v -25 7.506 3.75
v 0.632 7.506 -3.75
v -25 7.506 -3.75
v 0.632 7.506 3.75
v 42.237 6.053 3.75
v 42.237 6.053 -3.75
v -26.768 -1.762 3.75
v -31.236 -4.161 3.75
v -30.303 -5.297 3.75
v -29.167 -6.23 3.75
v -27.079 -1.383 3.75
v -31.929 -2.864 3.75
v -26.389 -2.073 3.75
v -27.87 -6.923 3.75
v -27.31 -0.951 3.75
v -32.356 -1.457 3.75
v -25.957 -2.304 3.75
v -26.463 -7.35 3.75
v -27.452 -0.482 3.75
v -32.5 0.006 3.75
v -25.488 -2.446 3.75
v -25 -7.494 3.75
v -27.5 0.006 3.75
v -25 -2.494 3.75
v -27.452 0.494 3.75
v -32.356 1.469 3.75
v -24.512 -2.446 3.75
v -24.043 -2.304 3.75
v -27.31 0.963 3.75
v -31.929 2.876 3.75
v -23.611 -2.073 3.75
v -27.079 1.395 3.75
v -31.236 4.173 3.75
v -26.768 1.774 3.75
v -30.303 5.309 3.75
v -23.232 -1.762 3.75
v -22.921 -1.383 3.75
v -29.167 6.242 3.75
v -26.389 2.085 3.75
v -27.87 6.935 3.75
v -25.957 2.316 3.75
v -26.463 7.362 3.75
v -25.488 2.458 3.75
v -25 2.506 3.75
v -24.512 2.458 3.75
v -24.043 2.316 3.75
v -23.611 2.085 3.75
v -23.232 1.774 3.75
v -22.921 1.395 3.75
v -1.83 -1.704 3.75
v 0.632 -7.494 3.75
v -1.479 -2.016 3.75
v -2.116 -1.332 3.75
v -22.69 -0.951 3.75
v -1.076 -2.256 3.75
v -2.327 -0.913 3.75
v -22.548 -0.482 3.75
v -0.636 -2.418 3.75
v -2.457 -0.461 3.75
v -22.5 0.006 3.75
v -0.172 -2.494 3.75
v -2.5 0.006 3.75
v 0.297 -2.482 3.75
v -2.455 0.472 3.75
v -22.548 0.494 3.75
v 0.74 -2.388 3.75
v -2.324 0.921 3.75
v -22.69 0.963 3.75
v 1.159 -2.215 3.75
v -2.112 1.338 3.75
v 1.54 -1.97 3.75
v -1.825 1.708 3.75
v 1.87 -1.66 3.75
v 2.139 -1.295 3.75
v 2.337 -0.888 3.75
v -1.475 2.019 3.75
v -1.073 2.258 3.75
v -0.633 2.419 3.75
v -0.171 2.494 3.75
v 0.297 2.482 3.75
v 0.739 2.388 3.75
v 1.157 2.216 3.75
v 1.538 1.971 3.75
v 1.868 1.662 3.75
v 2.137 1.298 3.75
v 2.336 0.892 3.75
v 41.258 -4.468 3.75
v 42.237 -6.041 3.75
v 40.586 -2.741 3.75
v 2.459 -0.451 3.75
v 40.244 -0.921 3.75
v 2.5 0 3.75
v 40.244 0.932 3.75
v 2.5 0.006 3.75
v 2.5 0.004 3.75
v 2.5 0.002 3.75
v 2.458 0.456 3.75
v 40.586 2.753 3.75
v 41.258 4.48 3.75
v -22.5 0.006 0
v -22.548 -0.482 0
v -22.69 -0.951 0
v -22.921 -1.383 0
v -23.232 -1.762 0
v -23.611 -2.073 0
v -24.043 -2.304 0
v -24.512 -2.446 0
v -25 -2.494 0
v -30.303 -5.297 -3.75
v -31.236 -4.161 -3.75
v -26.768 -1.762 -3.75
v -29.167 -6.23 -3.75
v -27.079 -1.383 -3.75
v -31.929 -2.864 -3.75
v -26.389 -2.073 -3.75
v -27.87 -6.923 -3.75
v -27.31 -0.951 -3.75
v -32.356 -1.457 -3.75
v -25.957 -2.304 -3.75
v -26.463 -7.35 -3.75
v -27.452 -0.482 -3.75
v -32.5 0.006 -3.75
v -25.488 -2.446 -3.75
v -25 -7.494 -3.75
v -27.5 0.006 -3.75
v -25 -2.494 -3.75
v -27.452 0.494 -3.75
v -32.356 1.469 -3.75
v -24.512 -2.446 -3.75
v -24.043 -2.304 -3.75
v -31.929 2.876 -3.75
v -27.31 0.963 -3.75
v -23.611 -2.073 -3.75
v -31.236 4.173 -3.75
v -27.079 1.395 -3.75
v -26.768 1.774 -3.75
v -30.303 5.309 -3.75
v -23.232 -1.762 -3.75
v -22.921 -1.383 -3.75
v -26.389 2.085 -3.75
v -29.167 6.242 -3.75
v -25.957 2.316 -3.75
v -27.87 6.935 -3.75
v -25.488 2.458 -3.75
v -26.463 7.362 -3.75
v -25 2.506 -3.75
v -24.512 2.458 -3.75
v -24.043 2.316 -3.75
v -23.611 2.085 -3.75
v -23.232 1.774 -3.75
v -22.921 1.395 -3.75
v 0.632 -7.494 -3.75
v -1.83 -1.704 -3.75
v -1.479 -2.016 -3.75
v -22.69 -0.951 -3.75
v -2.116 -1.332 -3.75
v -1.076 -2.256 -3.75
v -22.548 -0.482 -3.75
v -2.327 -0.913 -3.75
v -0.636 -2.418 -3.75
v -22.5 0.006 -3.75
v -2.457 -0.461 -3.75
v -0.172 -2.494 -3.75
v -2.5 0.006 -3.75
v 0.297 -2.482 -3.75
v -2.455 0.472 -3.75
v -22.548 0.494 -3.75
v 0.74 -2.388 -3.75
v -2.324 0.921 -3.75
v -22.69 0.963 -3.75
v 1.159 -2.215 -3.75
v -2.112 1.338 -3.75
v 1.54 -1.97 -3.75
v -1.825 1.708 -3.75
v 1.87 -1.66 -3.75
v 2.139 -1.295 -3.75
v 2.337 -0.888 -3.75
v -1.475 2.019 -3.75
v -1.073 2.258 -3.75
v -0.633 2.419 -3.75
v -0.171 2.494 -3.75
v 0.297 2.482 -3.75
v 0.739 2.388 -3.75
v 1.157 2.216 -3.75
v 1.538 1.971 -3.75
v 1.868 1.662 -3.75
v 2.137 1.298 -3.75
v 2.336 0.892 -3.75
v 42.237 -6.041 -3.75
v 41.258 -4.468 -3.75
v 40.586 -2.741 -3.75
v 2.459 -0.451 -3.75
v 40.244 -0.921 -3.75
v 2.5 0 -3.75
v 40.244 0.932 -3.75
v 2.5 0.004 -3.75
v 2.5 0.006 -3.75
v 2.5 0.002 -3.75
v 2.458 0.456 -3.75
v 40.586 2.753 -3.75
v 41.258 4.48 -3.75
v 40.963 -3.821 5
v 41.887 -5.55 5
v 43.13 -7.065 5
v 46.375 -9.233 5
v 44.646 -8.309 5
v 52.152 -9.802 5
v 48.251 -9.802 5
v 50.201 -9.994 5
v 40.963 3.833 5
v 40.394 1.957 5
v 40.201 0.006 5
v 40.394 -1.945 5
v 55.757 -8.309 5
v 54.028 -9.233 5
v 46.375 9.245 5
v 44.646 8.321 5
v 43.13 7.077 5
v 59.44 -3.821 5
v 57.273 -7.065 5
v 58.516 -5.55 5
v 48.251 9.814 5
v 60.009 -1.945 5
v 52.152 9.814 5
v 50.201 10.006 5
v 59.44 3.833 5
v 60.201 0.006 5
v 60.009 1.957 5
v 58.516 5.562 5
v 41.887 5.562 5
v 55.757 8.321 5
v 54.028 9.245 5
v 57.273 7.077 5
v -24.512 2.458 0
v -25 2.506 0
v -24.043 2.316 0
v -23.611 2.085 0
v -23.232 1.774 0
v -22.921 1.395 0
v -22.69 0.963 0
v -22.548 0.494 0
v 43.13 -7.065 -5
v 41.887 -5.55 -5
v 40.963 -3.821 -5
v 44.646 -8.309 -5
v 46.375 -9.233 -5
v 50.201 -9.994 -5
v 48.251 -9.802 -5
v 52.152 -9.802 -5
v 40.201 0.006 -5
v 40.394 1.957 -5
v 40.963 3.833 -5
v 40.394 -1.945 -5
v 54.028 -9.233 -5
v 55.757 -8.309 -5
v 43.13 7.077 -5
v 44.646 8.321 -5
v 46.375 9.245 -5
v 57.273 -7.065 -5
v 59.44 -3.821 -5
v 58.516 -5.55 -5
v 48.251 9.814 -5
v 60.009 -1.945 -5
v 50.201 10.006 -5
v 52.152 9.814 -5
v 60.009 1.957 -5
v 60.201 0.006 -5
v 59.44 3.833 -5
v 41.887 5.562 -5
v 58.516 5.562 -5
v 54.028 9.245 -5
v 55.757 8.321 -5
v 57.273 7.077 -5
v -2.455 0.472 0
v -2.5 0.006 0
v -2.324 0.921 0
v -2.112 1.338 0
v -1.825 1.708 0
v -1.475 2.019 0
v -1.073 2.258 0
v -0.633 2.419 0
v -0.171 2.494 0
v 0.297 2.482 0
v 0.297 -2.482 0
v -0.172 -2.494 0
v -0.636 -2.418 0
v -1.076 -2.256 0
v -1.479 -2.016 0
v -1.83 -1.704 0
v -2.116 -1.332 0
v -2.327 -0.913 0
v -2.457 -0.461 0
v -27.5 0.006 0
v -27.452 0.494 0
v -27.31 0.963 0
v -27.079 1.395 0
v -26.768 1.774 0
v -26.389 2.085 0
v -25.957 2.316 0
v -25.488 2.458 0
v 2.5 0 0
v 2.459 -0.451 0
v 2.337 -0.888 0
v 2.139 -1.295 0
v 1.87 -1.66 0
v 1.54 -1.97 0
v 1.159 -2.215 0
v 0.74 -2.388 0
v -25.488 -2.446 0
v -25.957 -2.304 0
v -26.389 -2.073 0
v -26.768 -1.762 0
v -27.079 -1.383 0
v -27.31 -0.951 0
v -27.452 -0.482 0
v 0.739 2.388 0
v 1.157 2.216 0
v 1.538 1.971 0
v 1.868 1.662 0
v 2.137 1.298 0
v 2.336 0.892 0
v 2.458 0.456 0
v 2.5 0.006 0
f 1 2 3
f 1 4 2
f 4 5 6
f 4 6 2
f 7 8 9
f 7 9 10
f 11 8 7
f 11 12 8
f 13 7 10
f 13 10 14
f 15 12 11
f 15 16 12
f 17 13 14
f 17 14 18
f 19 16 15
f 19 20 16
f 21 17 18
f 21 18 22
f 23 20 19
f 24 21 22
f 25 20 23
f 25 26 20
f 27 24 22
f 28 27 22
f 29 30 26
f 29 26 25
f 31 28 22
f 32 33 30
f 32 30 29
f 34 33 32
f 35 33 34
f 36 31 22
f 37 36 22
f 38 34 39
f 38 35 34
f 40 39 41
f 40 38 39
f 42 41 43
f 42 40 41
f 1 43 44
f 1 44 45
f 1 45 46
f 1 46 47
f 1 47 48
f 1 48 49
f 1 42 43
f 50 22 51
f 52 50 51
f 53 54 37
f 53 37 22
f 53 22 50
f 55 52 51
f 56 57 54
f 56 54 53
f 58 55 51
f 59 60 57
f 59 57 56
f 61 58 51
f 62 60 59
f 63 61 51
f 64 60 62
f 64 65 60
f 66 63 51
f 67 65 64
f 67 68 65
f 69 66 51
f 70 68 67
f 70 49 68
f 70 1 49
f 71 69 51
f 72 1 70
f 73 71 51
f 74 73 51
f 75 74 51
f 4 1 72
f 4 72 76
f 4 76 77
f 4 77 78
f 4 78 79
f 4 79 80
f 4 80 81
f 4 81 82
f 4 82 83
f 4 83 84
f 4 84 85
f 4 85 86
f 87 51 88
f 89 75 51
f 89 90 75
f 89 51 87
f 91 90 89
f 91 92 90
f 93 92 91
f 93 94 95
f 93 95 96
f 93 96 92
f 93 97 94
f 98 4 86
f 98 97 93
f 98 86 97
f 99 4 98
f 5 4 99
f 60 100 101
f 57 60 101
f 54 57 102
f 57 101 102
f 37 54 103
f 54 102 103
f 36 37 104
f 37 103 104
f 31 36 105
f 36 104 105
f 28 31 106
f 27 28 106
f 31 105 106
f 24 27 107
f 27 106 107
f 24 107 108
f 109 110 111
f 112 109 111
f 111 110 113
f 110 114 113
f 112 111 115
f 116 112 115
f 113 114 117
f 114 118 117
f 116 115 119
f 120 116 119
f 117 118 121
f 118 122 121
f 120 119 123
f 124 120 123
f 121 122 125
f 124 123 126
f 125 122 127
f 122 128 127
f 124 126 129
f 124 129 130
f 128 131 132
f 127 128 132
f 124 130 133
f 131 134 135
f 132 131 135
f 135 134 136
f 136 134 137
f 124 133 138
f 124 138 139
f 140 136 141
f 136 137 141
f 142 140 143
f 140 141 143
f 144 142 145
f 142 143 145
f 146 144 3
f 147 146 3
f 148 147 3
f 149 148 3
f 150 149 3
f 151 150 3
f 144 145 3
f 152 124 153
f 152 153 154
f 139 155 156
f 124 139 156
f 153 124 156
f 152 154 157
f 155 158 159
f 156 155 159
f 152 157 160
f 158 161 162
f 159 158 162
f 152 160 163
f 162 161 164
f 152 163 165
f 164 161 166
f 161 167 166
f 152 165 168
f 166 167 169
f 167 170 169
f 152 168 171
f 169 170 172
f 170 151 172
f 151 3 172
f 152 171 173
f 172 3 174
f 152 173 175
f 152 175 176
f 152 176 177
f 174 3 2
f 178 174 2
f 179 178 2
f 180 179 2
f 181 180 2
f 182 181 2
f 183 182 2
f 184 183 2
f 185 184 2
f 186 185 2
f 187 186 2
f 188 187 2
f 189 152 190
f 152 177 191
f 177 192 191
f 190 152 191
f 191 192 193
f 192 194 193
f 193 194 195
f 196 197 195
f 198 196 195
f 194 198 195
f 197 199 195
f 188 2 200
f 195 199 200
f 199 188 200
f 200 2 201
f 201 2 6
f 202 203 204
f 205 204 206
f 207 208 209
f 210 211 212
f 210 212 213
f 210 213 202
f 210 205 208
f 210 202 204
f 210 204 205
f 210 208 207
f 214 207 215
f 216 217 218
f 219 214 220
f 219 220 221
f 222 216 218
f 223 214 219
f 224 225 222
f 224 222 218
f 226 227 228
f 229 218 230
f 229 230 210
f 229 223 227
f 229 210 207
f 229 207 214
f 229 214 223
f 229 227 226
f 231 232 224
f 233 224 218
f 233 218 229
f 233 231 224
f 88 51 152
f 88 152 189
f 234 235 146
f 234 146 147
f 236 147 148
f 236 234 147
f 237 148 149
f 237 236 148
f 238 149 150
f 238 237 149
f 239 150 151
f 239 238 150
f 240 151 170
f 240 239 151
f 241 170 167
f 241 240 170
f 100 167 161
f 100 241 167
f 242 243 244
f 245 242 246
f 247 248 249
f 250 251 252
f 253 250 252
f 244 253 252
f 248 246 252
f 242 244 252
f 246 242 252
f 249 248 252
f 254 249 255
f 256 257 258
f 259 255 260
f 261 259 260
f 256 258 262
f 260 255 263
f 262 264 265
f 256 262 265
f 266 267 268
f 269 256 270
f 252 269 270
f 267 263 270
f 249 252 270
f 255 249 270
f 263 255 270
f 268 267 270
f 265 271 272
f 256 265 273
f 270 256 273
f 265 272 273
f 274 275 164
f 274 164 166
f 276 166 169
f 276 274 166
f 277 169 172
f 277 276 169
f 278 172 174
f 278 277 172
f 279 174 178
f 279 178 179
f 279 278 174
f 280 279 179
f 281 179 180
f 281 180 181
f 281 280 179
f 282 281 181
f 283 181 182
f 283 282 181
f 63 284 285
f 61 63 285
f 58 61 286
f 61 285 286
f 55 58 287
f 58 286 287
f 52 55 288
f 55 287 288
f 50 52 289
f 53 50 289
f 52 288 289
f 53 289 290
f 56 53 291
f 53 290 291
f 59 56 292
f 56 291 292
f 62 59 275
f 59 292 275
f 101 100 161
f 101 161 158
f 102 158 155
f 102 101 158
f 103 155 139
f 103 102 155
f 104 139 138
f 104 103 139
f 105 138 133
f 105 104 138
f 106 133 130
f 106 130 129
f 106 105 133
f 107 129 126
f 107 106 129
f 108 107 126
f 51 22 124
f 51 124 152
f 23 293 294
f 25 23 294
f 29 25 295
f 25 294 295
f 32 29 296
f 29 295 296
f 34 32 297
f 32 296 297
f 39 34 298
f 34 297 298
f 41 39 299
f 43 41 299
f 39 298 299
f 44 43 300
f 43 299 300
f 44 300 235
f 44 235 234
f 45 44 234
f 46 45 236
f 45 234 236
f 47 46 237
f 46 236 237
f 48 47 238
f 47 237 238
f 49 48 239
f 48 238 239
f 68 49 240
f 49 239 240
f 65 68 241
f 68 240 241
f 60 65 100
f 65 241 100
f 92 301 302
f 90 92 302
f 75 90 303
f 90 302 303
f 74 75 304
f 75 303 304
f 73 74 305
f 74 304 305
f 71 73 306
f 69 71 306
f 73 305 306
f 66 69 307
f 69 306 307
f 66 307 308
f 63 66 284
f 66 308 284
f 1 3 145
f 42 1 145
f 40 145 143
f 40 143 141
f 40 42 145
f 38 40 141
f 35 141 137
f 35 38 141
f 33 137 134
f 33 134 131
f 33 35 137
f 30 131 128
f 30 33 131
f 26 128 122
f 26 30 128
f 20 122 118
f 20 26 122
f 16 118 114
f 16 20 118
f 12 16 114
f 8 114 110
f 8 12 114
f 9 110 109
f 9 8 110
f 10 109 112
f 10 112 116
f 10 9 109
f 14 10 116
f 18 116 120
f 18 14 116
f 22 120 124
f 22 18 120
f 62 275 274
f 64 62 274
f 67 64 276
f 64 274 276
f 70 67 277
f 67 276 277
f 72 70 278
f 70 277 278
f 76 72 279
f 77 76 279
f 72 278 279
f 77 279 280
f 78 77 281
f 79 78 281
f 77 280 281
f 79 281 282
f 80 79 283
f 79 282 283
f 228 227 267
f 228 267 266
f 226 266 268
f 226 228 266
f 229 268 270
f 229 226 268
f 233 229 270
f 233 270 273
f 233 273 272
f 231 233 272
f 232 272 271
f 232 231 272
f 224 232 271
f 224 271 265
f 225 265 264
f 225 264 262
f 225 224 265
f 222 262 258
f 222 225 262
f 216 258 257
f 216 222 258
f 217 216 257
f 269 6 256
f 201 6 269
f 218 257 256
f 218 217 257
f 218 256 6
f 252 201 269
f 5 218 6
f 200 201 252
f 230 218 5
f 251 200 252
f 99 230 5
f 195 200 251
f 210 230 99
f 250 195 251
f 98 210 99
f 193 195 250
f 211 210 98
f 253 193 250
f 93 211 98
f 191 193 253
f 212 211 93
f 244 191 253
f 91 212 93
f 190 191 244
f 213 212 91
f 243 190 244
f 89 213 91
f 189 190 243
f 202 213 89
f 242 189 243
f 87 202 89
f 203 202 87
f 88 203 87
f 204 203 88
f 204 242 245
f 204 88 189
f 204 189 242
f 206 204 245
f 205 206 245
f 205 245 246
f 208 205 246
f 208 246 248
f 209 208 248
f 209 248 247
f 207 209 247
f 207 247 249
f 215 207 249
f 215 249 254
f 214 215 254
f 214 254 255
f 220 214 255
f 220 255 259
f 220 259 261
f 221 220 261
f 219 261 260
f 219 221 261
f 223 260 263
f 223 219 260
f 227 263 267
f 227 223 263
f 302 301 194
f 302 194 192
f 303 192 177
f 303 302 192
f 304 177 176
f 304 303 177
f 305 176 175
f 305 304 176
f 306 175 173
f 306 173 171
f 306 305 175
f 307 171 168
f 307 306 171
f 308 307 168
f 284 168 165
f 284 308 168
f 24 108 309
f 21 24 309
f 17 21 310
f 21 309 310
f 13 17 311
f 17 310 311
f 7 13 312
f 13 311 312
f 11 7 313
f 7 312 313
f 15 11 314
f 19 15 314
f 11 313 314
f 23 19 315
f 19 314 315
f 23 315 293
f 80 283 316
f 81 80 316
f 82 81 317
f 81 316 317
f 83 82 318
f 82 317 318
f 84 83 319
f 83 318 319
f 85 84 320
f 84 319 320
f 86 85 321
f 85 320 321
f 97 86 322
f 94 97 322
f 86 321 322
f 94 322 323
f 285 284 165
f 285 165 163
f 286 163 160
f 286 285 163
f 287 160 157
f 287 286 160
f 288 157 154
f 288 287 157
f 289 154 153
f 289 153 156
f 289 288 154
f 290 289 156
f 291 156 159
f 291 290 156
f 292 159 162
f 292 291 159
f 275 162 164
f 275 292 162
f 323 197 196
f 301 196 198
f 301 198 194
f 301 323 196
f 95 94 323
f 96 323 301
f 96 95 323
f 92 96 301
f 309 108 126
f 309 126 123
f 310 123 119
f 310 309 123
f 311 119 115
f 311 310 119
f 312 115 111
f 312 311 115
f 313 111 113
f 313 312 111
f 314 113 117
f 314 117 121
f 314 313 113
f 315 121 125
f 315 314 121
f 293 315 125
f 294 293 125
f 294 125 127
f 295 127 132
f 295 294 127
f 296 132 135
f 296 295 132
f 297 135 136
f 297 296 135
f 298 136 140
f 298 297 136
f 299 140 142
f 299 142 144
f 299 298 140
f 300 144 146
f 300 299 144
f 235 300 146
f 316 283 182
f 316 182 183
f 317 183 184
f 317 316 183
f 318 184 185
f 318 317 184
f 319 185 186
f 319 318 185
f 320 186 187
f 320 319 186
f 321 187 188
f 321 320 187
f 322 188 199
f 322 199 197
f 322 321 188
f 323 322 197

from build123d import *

# Parameters (mm, degrees)
BOSS_EXTRUDE1_DEPTH = 3.75
SKETCH2_R           = 10
BOSS_EXTRUDE2_DEPTH = 5


with BuildPart() as part:
    # Sketch1 → Boss-Extrude1 (new, symmetric)
    with BuildSketch(Plane.XY):
        with BuildLine():
            ThreePointArc((-17.5, 0.005872539), (-19.696699141, 5.309173398), (-25, 7.505872539))
            Line((-25, 7.505872539), (-25, 2.505872539))
            ThreePointArc((-25, 2.505872539), (-23.232233047, 1.773639492), (-22.5, 0.005872539))
            Line((-22.5, 0.005872539), (-17.5, 0.005872539))
        make_face()
        with BuildLine():
            Line((-25, 2.505872539), (-25, 7.505872539))
            ThreePointArc((-25, 7.505872539), (-30.303300859, 5.309173398), (-32.5, 0.005872539))
            Line((-32.5, 0.005872539), (-27.5, 0.005872539))
            ThreePointArc((-27.5, 0.005872539), (-26.767766953, 1.773639492), (-25, 2.505872539))
        make_face()
        with BuildLine():
            ThreePointArc((-25, -7.494127461), (-19.696699141, -5.29742832), (-17.5, 0.005872539))
            Line((-17.5, 0.005872539), (-22.5, 0.005872539))
            ThreePointArc((-22.5, 0.005872539), (-23.232233047, -1.761894414), (-25, -2.494127461))
            Line((-25, -2.494127461), (-25, -7.494127461))
        make_face()
        with BuildLine():
            Line((-27.5, 0.005872539), (-32.5, 0.005872539))
            ThreePointArc((-32.5, 0.005872539), (-30.303300859, -5.29742832), (-25, -7.494127461))
            Line((-25, -7.494127461), (-25, -2.494127461))
            ThreePointArc((-25, -2.494127461), (-26.767766953, -1.761894414), (-27.5, 0.005872539))
        make_face()
        with BuildLine():
            ThreePointArc((50.201457579, -5.763117708), (54.152393819, -4.00404756), (55.772506702, 0.005872539))
            Line((55.772506702, 0.005872539), (2.499993103, 0.005872539))
            ThreePointArc((2.499993103, 0.005872539), (2.499998276, 0.002936272), (2.5, 0))
            ThreePointArc((2.5, 0), (1.869738707, -1.659541253), (0.296738265, -2.482326812))
            ThreePointArc((0.296738265, -2.482326812), (-1.661736132, -1.867788272), (-2.499993103, 0.005872539))
            Line((-2.499993103, 0.005872539), (-17.5, 0.005872539))
            ThreePointArc((-17.5, 0.005872539), (-19.696699141, -5.29742832), (-25, -7.494127461))
            Line((-25, -7.494127461), (0.631823856, -7.494127461))
            Line((0.631823856, -7.494127461), (50.201457579, -5.763117708))
        make_face()
        with BuildLine():
            Line((50.201457579, 5.774862786), (0.631823856, 7.505872539))
            Line((0.631823856, 7.505872539), (-25, 7.505872539))
            ThreePointArc((-25, 7.505872539), (-19.696699141, 5.309173398), (-17.5, 0.005872539))
            Line((-17.5, 0.005872539), (-2.499993103, 0.005872539))
            ThreePointArc((-2.499993103, 0.005872539), (-1.657344084, 1.871686562), (0.296738265, 2.482326812))
            ThreePointArc((0.296738265, 2.482326812), (1.867788272, 1.661736132), (2.499993103, 0.005872539))
            Line((2.499993103, 0.005872539), (55.772506702, 0.005872539))
            ThreePointArc((55.772506702, 0.005872539), (54.152393819, 4.015792638), (50.201457579, 5.774862786))
        make_face()
    extrude(amount=BOSS_EXTRUDE1_DEPTH, both=True)

    # Sketch2 → Boss-Extrude2 (add, symmetric)
    with BuildSketch(Plane.XY):
        with Locations((50.201457579, 0.005872539)):
            Circle(SKETCH2_R)
    extrude(amount=BOSS_EXTRUDE2_DEPTH, both=True)


solid = part.part
